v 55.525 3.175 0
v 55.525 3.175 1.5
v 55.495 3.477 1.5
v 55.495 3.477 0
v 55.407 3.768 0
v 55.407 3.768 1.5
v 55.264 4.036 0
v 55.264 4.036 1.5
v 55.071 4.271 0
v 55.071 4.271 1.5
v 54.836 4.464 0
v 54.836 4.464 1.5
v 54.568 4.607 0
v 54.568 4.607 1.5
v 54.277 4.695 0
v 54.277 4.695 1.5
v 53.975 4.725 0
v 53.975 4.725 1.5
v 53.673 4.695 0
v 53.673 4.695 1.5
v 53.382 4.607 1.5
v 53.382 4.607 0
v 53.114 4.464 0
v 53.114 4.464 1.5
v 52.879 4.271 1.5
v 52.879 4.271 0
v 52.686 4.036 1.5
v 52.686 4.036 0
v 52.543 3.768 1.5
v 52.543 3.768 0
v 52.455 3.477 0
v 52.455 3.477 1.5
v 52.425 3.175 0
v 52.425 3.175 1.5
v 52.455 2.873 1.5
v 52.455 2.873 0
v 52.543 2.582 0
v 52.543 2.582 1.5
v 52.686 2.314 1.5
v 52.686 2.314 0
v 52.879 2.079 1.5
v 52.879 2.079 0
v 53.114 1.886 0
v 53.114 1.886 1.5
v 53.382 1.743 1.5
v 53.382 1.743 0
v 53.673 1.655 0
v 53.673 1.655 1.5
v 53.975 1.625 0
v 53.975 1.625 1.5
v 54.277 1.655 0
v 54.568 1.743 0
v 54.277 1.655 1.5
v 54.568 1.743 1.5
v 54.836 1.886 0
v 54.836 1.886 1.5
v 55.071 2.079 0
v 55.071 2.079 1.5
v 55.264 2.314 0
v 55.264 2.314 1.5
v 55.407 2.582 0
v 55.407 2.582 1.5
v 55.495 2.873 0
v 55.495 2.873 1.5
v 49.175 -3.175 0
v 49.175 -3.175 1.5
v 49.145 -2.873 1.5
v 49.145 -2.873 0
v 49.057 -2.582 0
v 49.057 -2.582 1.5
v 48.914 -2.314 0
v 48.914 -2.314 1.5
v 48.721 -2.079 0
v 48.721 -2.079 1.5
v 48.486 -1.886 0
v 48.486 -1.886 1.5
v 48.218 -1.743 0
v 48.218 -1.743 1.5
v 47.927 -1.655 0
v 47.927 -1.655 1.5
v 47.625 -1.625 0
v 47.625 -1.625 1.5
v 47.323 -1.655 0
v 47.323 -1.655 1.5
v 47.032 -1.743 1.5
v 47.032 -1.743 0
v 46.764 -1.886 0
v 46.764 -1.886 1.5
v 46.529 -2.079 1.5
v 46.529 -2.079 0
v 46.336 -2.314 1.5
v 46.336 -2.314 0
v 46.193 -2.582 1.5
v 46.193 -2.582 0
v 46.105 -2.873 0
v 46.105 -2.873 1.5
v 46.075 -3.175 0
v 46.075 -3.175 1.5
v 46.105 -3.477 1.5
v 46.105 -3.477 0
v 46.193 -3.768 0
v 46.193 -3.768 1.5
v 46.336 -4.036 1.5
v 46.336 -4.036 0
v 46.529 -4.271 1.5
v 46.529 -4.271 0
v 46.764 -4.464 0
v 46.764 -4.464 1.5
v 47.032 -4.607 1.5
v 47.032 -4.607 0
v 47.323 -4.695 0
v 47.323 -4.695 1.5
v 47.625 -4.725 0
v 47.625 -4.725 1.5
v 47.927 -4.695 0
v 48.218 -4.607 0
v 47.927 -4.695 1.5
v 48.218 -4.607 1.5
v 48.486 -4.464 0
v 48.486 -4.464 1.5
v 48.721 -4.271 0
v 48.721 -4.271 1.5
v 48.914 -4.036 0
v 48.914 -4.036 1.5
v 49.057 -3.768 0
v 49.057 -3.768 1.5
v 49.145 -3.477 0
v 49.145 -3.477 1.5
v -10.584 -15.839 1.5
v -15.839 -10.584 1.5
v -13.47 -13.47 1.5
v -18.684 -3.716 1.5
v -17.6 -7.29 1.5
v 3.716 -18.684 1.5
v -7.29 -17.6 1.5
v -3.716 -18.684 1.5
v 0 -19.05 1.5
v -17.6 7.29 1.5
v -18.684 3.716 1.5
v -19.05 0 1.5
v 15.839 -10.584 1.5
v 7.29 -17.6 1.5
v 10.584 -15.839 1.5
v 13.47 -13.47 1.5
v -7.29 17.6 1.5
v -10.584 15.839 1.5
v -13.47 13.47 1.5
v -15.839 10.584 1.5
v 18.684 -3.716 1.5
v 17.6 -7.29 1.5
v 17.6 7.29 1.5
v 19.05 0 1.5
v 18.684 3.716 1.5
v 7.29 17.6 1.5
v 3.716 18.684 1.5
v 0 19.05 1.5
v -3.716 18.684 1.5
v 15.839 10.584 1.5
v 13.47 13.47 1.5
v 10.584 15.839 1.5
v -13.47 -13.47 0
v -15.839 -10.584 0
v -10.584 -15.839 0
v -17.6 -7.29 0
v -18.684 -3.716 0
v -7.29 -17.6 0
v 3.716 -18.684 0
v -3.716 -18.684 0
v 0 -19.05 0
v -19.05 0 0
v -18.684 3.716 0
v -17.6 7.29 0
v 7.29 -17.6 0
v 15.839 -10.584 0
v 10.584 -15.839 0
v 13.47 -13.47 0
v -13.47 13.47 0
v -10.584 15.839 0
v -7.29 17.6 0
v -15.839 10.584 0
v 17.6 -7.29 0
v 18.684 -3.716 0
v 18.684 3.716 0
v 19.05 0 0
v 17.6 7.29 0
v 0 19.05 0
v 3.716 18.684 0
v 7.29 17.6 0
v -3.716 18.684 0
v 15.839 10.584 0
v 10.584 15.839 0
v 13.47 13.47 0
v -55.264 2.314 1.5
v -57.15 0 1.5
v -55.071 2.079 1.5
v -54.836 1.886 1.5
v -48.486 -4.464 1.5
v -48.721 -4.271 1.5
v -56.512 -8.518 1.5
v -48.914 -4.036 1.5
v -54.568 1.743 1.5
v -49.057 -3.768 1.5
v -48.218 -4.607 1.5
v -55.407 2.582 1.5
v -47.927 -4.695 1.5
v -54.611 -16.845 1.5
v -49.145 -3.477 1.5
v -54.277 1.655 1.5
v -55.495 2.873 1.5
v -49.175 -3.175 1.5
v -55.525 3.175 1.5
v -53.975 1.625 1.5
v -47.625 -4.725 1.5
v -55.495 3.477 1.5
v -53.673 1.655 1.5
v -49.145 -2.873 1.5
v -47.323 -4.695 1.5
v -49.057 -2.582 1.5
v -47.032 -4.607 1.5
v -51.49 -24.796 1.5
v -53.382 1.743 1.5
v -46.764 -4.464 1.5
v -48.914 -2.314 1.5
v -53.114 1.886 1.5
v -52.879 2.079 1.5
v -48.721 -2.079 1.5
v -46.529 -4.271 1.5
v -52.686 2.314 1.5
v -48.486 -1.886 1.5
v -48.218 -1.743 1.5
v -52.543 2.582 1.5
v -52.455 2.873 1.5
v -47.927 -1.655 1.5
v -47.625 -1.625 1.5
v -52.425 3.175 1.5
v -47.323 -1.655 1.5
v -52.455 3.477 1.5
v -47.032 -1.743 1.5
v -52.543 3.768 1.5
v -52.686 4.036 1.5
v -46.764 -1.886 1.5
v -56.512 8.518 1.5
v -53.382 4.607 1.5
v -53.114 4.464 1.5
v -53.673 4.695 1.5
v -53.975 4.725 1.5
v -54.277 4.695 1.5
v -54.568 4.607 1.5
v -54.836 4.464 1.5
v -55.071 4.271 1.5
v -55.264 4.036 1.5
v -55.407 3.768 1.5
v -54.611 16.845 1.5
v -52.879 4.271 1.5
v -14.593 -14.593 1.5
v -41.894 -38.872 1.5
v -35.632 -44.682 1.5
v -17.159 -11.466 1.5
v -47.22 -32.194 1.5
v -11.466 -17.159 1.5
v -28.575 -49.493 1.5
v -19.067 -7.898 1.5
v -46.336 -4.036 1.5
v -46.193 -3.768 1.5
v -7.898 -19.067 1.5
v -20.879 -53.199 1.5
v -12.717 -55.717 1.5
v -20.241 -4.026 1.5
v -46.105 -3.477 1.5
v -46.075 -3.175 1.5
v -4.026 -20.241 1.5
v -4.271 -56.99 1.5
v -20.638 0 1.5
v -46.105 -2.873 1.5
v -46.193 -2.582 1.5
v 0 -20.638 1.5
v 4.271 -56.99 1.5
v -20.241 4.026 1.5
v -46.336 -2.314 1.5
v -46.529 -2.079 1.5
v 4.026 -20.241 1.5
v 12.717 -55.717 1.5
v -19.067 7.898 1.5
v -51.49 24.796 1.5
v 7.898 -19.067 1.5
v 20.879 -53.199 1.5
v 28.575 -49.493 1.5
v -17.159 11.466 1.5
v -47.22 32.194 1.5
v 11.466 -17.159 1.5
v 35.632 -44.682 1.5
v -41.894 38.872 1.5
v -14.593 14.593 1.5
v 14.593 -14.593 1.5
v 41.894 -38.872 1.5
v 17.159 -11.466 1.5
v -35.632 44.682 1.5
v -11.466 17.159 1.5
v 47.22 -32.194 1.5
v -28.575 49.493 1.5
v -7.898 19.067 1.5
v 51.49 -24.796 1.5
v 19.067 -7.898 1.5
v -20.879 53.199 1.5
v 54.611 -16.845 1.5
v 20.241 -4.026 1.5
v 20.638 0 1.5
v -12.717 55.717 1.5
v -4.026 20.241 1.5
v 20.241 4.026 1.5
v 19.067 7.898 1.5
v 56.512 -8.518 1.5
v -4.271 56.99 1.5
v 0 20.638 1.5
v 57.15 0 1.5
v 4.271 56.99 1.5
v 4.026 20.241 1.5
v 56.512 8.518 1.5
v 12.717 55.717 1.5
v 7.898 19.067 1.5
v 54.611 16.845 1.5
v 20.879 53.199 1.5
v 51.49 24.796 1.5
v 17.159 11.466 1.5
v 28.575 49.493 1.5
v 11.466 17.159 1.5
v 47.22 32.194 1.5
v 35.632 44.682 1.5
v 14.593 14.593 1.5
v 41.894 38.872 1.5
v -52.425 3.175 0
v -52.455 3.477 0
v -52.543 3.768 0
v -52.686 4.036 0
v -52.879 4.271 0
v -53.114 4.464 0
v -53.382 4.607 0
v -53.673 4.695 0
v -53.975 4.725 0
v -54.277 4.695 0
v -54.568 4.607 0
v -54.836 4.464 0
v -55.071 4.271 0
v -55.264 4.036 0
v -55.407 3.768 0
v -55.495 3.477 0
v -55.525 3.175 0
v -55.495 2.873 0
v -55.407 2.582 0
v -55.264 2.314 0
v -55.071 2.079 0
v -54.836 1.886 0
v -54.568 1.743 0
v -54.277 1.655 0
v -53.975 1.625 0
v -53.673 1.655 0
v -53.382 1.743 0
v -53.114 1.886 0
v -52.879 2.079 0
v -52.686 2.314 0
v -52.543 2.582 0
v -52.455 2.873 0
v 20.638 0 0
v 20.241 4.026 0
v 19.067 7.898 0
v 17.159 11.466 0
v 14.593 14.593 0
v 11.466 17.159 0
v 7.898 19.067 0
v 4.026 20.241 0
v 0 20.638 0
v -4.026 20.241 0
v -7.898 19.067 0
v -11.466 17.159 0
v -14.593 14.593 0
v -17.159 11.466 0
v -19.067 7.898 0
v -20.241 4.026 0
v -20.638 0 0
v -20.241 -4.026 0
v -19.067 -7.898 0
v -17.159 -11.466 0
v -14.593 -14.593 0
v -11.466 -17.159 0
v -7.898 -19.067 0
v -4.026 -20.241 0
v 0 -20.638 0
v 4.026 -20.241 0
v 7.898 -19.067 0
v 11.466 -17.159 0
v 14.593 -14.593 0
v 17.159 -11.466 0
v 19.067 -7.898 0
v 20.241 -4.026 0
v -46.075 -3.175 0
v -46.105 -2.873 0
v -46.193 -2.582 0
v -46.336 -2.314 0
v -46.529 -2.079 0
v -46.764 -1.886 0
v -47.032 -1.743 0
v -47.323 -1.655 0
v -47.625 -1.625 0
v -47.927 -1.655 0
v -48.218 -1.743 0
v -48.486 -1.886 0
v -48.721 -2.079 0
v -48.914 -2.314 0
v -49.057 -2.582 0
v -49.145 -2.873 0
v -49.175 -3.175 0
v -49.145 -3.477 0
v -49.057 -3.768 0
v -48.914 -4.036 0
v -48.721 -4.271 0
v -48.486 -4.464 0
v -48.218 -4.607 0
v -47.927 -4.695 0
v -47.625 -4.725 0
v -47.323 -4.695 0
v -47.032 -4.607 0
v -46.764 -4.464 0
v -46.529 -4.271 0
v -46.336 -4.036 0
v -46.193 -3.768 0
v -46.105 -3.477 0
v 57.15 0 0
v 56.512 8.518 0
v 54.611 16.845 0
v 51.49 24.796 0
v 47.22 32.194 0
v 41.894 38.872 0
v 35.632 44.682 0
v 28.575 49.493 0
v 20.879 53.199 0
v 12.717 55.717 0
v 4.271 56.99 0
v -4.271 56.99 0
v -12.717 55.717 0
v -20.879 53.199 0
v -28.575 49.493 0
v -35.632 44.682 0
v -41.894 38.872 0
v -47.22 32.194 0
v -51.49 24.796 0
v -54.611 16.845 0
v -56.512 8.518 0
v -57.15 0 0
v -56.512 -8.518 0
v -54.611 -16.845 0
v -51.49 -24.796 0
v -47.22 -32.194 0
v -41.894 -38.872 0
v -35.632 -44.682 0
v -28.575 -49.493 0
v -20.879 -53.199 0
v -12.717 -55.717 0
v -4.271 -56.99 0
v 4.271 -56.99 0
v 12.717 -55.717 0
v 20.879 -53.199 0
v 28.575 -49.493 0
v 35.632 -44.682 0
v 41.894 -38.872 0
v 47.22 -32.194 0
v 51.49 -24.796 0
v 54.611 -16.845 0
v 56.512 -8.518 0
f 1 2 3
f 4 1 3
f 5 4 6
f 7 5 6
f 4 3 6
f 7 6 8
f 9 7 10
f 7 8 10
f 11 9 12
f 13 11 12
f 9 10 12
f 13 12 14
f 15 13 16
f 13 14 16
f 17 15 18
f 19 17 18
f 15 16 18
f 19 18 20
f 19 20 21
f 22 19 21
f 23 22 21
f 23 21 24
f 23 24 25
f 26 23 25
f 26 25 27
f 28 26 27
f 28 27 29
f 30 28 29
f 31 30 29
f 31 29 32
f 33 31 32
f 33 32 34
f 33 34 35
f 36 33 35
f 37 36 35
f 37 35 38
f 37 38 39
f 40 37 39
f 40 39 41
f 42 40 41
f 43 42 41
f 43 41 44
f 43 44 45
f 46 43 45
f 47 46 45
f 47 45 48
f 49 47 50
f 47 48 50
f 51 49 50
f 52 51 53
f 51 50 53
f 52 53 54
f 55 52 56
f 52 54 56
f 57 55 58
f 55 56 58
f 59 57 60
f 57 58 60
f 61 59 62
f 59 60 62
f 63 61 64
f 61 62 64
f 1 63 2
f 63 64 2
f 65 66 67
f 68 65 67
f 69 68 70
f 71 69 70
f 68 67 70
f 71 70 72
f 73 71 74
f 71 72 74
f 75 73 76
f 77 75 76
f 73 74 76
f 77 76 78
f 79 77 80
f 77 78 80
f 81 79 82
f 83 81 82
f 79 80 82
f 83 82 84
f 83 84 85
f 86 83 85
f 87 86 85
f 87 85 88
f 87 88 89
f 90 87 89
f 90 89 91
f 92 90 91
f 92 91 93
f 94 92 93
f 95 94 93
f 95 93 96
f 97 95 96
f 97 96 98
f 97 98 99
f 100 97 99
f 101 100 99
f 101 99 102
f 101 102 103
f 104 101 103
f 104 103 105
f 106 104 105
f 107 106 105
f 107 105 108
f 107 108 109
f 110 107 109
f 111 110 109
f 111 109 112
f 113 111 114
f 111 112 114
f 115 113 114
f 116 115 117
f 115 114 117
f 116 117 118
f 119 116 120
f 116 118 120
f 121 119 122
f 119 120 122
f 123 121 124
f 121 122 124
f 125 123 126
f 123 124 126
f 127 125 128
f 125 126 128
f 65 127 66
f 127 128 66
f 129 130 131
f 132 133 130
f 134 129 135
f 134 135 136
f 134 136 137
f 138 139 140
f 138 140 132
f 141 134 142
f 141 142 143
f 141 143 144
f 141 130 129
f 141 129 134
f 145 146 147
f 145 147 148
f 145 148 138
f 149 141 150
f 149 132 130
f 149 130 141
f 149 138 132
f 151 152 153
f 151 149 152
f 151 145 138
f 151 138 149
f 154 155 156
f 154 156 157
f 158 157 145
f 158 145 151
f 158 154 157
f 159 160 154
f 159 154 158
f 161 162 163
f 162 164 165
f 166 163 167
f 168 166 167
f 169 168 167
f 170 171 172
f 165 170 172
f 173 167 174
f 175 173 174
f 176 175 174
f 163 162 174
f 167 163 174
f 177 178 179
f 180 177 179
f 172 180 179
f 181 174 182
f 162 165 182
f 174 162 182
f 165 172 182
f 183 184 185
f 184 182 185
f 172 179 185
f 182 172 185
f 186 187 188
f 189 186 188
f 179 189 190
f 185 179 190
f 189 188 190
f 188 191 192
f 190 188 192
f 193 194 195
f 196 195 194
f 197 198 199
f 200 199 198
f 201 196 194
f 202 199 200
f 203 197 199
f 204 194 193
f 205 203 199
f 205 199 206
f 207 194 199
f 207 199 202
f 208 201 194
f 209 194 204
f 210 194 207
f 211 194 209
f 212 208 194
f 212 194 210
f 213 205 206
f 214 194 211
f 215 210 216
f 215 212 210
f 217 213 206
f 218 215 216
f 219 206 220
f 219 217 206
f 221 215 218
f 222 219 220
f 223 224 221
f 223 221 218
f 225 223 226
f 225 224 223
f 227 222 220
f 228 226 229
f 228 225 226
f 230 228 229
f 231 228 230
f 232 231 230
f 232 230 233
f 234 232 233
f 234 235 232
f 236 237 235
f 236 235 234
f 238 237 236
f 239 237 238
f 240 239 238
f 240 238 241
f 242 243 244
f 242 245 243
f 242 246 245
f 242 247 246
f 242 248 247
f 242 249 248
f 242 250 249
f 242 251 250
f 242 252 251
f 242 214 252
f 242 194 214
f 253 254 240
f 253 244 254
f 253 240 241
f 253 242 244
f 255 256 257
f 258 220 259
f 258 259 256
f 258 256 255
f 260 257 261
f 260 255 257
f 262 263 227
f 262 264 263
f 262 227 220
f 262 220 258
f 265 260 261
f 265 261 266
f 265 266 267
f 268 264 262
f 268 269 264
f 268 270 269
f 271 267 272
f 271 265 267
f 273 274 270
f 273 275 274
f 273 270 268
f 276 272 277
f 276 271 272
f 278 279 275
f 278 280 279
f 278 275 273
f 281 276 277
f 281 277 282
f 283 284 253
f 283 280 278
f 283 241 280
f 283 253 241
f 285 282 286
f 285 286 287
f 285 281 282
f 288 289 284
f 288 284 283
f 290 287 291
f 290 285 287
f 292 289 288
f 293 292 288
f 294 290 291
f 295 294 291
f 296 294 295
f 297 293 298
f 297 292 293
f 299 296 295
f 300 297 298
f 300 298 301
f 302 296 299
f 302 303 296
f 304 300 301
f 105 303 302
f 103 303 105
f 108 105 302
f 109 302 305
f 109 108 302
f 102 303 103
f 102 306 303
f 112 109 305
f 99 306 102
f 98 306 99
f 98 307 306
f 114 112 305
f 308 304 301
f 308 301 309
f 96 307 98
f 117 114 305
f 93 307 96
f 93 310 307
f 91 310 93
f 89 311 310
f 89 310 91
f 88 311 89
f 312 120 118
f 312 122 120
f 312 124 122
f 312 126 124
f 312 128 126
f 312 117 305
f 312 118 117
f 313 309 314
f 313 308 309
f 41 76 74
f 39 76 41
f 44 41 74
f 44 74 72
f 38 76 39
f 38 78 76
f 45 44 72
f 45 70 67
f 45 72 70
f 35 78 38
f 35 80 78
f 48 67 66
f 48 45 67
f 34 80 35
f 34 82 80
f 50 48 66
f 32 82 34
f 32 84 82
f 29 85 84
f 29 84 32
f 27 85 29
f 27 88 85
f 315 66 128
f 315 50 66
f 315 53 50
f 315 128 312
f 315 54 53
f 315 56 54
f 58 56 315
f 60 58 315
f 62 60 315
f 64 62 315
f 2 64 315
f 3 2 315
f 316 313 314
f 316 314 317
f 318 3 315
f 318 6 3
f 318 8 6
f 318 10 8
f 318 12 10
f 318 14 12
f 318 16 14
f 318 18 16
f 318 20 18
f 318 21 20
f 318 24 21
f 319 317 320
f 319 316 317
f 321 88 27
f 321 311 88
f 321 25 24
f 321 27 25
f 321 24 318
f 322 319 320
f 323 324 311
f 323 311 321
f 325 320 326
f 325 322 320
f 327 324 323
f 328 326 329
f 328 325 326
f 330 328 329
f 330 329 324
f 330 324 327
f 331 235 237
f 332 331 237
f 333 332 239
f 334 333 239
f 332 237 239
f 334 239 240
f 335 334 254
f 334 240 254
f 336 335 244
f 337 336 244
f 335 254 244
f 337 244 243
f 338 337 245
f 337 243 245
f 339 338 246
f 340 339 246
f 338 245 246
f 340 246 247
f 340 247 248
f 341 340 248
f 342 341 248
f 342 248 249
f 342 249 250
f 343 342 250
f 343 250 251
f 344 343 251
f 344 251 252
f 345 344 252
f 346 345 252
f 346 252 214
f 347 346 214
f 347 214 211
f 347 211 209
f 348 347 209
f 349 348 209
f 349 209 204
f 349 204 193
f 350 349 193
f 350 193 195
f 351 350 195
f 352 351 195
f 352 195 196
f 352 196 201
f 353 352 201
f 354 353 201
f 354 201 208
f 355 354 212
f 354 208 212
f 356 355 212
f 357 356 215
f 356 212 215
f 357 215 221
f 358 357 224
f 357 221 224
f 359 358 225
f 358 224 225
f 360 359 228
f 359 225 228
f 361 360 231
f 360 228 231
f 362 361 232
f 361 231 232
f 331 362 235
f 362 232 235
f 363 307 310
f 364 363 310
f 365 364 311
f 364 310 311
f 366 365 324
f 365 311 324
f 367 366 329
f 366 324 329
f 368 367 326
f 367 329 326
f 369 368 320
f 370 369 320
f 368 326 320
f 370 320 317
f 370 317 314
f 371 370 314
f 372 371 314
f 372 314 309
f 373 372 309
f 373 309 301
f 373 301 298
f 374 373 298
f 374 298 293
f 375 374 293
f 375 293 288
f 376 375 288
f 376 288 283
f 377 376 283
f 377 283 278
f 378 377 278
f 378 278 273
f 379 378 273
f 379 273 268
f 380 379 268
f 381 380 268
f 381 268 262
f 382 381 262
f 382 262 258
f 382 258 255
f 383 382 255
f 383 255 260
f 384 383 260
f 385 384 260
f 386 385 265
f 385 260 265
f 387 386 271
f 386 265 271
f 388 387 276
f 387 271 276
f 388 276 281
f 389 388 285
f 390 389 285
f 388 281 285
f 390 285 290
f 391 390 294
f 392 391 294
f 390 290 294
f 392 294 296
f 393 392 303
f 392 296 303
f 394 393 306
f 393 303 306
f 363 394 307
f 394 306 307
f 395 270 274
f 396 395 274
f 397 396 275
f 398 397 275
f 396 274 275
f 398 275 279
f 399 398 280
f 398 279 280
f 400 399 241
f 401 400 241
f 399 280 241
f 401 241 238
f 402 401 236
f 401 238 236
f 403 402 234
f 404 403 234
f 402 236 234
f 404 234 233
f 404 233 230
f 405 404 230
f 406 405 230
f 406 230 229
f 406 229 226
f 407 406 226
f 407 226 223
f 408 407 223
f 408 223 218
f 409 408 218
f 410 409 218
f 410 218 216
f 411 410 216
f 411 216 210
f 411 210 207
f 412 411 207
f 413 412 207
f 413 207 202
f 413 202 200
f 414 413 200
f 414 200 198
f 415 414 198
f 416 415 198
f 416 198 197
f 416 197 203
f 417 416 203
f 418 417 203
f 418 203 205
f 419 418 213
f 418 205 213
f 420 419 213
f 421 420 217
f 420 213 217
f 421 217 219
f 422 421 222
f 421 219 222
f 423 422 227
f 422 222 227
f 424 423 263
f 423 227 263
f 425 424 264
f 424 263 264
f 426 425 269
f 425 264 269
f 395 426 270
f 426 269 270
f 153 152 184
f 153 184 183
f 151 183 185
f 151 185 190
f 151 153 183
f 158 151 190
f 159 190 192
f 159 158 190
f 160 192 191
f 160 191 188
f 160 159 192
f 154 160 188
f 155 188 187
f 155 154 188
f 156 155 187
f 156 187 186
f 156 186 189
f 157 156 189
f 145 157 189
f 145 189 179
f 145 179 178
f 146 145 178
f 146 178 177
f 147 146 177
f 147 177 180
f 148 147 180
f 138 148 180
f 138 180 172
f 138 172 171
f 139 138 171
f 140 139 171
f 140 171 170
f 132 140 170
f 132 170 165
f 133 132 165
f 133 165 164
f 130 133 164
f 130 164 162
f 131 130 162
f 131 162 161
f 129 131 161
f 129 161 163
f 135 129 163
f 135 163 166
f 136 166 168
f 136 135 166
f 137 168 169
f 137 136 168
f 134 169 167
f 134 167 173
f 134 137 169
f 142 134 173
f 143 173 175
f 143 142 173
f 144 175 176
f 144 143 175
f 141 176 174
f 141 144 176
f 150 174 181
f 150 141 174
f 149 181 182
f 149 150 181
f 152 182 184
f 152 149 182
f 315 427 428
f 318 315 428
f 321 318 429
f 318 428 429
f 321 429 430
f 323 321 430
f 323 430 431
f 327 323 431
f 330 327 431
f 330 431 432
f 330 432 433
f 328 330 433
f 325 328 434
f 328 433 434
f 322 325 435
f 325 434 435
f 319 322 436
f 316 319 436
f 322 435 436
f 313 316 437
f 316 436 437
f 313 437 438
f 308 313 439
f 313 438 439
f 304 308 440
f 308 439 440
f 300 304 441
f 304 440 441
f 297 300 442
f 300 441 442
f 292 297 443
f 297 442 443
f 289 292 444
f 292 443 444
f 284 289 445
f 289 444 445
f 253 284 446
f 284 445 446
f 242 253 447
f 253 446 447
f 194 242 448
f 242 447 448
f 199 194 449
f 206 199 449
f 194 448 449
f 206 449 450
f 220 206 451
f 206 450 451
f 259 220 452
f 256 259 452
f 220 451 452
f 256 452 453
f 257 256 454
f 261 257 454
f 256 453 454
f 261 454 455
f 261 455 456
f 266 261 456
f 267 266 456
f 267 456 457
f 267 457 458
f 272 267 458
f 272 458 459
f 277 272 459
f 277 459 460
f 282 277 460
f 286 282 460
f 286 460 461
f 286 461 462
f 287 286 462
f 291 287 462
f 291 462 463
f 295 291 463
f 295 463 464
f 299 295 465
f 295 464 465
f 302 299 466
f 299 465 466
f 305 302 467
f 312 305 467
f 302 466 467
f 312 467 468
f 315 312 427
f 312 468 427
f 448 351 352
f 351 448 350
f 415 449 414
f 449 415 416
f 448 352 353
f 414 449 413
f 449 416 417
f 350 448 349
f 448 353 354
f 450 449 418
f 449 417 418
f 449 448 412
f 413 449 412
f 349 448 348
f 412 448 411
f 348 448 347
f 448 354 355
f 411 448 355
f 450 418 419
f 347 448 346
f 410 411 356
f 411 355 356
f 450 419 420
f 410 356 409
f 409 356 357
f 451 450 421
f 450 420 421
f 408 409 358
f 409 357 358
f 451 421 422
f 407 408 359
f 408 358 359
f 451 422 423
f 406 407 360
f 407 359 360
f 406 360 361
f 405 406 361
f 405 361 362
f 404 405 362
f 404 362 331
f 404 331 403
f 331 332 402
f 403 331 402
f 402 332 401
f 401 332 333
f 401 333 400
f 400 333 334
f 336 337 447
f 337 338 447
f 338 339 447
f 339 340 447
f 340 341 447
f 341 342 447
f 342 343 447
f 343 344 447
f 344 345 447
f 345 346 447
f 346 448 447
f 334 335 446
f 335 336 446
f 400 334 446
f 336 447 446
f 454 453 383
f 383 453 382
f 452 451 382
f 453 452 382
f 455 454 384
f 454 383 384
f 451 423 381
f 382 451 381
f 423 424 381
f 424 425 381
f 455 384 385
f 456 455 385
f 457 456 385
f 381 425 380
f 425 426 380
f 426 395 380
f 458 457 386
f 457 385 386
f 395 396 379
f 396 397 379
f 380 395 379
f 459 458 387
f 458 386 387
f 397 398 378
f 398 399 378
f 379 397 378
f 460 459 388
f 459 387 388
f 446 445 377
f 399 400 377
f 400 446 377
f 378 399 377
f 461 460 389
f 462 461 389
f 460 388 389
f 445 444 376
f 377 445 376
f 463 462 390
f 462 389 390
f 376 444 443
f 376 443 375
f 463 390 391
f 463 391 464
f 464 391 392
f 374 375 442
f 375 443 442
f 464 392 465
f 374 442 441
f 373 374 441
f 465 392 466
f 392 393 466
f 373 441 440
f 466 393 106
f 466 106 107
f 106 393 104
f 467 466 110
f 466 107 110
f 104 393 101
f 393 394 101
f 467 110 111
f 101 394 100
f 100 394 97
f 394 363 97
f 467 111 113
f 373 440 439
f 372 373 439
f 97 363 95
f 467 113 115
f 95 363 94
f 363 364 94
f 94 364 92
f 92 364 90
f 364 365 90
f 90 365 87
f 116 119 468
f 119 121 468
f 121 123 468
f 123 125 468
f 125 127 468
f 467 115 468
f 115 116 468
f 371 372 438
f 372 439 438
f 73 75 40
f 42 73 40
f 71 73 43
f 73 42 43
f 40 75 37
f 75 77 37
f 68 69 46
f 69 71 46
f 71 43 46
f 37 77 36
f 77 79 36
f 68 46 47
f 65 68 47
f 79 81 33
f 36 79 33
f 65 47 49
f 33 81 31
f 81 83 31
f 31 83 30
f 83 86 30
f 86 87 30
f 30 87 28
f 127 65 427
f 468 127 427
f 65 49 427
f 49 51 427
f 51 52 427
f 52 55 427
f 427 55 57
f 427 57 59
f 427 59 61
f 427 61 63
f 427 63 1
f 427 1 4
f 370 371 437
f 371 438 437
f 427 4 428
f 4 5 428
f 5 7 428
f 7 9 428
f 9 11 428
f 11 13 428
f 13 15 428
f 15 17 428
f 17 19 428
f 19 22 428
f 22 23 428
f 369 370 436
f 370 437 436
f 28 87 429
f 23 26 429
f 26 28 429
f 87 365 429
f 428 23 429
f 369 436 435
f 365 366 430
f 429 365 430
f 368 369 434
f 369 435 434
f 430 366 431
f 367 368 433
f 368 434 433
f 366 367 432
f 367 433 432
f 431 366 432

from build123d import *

# Parameters (mm, degrees)
SKETCH1_R          = 57.15
EXTRUDE1_DEPTH     = 1.5
SKETCH2_R          = 1.55
CUT_EXTRUDE1_DEPTH = 81.836223316
SKETCH3_R          = 20.6375
SKETCH3_R_2        = 19.05
CUT_EXTRUDE2_DEPTH = 81.836223316


with BuildPart() as part:
    # Sketch1 → Extrude1 (new body)
    with BuildSketch(Plane.XY):
        Circle(SKETCH1_R)
    extrude(amount=EXTRUDE1_DEPTH)

    # Sketch2 → Cut-Extrude1 (cut, through all)
    with BuildSketch(Plane.XY.offset(1.5)):
        with Locations((-53.975, 3.175)):
            Circle(SKETCH2_R)
        with Locations((-47.625, -3.175)):
            Circle(SKETCH2_R)
        with Locations((53.975, 3.175)):
            Circle(SKETCH2_R)
        with Locations((47.625, -3.175)):
            Circle(SKETCH2_R)
    extrude(amount=-CUT_EXTRUDE1_DEPTH, mode=Mode.SUBTRACT)

    # Sketch3 → Cut-Extrude2 (cut, through all)
    with BuildSketch(Plane.XY.offset(1.5)):
        Circle(SKETCH3_R)
        Circle(SKETCH3_R_2, mode=Mode.SUBTRACT)
    extrude(amount=-CUT_EXTRUDE2_DEPTH, mode=Mode.SUBTRACT)


with BuildPart() as cut_extrude2_piece_1:
    # of the separate pieces the step leaves, piece 1, a body of its own (cut_extrude2_pieces)
    add(part.part.solids().sort_by_distance((57.15, 0, 0))[0])


with BuildPart() as cut_extrude2_piece_2:
    # of the separate pieces the step leaves, piece 2, a body of its own (cut_extrude2_pieces)
    add(part.part.solids().sort_by_distance((19.05, 0, 0))[0])


solid = Compound([cut_extrude2_piece_1.part, cut_extrude2_piece_2.part])
